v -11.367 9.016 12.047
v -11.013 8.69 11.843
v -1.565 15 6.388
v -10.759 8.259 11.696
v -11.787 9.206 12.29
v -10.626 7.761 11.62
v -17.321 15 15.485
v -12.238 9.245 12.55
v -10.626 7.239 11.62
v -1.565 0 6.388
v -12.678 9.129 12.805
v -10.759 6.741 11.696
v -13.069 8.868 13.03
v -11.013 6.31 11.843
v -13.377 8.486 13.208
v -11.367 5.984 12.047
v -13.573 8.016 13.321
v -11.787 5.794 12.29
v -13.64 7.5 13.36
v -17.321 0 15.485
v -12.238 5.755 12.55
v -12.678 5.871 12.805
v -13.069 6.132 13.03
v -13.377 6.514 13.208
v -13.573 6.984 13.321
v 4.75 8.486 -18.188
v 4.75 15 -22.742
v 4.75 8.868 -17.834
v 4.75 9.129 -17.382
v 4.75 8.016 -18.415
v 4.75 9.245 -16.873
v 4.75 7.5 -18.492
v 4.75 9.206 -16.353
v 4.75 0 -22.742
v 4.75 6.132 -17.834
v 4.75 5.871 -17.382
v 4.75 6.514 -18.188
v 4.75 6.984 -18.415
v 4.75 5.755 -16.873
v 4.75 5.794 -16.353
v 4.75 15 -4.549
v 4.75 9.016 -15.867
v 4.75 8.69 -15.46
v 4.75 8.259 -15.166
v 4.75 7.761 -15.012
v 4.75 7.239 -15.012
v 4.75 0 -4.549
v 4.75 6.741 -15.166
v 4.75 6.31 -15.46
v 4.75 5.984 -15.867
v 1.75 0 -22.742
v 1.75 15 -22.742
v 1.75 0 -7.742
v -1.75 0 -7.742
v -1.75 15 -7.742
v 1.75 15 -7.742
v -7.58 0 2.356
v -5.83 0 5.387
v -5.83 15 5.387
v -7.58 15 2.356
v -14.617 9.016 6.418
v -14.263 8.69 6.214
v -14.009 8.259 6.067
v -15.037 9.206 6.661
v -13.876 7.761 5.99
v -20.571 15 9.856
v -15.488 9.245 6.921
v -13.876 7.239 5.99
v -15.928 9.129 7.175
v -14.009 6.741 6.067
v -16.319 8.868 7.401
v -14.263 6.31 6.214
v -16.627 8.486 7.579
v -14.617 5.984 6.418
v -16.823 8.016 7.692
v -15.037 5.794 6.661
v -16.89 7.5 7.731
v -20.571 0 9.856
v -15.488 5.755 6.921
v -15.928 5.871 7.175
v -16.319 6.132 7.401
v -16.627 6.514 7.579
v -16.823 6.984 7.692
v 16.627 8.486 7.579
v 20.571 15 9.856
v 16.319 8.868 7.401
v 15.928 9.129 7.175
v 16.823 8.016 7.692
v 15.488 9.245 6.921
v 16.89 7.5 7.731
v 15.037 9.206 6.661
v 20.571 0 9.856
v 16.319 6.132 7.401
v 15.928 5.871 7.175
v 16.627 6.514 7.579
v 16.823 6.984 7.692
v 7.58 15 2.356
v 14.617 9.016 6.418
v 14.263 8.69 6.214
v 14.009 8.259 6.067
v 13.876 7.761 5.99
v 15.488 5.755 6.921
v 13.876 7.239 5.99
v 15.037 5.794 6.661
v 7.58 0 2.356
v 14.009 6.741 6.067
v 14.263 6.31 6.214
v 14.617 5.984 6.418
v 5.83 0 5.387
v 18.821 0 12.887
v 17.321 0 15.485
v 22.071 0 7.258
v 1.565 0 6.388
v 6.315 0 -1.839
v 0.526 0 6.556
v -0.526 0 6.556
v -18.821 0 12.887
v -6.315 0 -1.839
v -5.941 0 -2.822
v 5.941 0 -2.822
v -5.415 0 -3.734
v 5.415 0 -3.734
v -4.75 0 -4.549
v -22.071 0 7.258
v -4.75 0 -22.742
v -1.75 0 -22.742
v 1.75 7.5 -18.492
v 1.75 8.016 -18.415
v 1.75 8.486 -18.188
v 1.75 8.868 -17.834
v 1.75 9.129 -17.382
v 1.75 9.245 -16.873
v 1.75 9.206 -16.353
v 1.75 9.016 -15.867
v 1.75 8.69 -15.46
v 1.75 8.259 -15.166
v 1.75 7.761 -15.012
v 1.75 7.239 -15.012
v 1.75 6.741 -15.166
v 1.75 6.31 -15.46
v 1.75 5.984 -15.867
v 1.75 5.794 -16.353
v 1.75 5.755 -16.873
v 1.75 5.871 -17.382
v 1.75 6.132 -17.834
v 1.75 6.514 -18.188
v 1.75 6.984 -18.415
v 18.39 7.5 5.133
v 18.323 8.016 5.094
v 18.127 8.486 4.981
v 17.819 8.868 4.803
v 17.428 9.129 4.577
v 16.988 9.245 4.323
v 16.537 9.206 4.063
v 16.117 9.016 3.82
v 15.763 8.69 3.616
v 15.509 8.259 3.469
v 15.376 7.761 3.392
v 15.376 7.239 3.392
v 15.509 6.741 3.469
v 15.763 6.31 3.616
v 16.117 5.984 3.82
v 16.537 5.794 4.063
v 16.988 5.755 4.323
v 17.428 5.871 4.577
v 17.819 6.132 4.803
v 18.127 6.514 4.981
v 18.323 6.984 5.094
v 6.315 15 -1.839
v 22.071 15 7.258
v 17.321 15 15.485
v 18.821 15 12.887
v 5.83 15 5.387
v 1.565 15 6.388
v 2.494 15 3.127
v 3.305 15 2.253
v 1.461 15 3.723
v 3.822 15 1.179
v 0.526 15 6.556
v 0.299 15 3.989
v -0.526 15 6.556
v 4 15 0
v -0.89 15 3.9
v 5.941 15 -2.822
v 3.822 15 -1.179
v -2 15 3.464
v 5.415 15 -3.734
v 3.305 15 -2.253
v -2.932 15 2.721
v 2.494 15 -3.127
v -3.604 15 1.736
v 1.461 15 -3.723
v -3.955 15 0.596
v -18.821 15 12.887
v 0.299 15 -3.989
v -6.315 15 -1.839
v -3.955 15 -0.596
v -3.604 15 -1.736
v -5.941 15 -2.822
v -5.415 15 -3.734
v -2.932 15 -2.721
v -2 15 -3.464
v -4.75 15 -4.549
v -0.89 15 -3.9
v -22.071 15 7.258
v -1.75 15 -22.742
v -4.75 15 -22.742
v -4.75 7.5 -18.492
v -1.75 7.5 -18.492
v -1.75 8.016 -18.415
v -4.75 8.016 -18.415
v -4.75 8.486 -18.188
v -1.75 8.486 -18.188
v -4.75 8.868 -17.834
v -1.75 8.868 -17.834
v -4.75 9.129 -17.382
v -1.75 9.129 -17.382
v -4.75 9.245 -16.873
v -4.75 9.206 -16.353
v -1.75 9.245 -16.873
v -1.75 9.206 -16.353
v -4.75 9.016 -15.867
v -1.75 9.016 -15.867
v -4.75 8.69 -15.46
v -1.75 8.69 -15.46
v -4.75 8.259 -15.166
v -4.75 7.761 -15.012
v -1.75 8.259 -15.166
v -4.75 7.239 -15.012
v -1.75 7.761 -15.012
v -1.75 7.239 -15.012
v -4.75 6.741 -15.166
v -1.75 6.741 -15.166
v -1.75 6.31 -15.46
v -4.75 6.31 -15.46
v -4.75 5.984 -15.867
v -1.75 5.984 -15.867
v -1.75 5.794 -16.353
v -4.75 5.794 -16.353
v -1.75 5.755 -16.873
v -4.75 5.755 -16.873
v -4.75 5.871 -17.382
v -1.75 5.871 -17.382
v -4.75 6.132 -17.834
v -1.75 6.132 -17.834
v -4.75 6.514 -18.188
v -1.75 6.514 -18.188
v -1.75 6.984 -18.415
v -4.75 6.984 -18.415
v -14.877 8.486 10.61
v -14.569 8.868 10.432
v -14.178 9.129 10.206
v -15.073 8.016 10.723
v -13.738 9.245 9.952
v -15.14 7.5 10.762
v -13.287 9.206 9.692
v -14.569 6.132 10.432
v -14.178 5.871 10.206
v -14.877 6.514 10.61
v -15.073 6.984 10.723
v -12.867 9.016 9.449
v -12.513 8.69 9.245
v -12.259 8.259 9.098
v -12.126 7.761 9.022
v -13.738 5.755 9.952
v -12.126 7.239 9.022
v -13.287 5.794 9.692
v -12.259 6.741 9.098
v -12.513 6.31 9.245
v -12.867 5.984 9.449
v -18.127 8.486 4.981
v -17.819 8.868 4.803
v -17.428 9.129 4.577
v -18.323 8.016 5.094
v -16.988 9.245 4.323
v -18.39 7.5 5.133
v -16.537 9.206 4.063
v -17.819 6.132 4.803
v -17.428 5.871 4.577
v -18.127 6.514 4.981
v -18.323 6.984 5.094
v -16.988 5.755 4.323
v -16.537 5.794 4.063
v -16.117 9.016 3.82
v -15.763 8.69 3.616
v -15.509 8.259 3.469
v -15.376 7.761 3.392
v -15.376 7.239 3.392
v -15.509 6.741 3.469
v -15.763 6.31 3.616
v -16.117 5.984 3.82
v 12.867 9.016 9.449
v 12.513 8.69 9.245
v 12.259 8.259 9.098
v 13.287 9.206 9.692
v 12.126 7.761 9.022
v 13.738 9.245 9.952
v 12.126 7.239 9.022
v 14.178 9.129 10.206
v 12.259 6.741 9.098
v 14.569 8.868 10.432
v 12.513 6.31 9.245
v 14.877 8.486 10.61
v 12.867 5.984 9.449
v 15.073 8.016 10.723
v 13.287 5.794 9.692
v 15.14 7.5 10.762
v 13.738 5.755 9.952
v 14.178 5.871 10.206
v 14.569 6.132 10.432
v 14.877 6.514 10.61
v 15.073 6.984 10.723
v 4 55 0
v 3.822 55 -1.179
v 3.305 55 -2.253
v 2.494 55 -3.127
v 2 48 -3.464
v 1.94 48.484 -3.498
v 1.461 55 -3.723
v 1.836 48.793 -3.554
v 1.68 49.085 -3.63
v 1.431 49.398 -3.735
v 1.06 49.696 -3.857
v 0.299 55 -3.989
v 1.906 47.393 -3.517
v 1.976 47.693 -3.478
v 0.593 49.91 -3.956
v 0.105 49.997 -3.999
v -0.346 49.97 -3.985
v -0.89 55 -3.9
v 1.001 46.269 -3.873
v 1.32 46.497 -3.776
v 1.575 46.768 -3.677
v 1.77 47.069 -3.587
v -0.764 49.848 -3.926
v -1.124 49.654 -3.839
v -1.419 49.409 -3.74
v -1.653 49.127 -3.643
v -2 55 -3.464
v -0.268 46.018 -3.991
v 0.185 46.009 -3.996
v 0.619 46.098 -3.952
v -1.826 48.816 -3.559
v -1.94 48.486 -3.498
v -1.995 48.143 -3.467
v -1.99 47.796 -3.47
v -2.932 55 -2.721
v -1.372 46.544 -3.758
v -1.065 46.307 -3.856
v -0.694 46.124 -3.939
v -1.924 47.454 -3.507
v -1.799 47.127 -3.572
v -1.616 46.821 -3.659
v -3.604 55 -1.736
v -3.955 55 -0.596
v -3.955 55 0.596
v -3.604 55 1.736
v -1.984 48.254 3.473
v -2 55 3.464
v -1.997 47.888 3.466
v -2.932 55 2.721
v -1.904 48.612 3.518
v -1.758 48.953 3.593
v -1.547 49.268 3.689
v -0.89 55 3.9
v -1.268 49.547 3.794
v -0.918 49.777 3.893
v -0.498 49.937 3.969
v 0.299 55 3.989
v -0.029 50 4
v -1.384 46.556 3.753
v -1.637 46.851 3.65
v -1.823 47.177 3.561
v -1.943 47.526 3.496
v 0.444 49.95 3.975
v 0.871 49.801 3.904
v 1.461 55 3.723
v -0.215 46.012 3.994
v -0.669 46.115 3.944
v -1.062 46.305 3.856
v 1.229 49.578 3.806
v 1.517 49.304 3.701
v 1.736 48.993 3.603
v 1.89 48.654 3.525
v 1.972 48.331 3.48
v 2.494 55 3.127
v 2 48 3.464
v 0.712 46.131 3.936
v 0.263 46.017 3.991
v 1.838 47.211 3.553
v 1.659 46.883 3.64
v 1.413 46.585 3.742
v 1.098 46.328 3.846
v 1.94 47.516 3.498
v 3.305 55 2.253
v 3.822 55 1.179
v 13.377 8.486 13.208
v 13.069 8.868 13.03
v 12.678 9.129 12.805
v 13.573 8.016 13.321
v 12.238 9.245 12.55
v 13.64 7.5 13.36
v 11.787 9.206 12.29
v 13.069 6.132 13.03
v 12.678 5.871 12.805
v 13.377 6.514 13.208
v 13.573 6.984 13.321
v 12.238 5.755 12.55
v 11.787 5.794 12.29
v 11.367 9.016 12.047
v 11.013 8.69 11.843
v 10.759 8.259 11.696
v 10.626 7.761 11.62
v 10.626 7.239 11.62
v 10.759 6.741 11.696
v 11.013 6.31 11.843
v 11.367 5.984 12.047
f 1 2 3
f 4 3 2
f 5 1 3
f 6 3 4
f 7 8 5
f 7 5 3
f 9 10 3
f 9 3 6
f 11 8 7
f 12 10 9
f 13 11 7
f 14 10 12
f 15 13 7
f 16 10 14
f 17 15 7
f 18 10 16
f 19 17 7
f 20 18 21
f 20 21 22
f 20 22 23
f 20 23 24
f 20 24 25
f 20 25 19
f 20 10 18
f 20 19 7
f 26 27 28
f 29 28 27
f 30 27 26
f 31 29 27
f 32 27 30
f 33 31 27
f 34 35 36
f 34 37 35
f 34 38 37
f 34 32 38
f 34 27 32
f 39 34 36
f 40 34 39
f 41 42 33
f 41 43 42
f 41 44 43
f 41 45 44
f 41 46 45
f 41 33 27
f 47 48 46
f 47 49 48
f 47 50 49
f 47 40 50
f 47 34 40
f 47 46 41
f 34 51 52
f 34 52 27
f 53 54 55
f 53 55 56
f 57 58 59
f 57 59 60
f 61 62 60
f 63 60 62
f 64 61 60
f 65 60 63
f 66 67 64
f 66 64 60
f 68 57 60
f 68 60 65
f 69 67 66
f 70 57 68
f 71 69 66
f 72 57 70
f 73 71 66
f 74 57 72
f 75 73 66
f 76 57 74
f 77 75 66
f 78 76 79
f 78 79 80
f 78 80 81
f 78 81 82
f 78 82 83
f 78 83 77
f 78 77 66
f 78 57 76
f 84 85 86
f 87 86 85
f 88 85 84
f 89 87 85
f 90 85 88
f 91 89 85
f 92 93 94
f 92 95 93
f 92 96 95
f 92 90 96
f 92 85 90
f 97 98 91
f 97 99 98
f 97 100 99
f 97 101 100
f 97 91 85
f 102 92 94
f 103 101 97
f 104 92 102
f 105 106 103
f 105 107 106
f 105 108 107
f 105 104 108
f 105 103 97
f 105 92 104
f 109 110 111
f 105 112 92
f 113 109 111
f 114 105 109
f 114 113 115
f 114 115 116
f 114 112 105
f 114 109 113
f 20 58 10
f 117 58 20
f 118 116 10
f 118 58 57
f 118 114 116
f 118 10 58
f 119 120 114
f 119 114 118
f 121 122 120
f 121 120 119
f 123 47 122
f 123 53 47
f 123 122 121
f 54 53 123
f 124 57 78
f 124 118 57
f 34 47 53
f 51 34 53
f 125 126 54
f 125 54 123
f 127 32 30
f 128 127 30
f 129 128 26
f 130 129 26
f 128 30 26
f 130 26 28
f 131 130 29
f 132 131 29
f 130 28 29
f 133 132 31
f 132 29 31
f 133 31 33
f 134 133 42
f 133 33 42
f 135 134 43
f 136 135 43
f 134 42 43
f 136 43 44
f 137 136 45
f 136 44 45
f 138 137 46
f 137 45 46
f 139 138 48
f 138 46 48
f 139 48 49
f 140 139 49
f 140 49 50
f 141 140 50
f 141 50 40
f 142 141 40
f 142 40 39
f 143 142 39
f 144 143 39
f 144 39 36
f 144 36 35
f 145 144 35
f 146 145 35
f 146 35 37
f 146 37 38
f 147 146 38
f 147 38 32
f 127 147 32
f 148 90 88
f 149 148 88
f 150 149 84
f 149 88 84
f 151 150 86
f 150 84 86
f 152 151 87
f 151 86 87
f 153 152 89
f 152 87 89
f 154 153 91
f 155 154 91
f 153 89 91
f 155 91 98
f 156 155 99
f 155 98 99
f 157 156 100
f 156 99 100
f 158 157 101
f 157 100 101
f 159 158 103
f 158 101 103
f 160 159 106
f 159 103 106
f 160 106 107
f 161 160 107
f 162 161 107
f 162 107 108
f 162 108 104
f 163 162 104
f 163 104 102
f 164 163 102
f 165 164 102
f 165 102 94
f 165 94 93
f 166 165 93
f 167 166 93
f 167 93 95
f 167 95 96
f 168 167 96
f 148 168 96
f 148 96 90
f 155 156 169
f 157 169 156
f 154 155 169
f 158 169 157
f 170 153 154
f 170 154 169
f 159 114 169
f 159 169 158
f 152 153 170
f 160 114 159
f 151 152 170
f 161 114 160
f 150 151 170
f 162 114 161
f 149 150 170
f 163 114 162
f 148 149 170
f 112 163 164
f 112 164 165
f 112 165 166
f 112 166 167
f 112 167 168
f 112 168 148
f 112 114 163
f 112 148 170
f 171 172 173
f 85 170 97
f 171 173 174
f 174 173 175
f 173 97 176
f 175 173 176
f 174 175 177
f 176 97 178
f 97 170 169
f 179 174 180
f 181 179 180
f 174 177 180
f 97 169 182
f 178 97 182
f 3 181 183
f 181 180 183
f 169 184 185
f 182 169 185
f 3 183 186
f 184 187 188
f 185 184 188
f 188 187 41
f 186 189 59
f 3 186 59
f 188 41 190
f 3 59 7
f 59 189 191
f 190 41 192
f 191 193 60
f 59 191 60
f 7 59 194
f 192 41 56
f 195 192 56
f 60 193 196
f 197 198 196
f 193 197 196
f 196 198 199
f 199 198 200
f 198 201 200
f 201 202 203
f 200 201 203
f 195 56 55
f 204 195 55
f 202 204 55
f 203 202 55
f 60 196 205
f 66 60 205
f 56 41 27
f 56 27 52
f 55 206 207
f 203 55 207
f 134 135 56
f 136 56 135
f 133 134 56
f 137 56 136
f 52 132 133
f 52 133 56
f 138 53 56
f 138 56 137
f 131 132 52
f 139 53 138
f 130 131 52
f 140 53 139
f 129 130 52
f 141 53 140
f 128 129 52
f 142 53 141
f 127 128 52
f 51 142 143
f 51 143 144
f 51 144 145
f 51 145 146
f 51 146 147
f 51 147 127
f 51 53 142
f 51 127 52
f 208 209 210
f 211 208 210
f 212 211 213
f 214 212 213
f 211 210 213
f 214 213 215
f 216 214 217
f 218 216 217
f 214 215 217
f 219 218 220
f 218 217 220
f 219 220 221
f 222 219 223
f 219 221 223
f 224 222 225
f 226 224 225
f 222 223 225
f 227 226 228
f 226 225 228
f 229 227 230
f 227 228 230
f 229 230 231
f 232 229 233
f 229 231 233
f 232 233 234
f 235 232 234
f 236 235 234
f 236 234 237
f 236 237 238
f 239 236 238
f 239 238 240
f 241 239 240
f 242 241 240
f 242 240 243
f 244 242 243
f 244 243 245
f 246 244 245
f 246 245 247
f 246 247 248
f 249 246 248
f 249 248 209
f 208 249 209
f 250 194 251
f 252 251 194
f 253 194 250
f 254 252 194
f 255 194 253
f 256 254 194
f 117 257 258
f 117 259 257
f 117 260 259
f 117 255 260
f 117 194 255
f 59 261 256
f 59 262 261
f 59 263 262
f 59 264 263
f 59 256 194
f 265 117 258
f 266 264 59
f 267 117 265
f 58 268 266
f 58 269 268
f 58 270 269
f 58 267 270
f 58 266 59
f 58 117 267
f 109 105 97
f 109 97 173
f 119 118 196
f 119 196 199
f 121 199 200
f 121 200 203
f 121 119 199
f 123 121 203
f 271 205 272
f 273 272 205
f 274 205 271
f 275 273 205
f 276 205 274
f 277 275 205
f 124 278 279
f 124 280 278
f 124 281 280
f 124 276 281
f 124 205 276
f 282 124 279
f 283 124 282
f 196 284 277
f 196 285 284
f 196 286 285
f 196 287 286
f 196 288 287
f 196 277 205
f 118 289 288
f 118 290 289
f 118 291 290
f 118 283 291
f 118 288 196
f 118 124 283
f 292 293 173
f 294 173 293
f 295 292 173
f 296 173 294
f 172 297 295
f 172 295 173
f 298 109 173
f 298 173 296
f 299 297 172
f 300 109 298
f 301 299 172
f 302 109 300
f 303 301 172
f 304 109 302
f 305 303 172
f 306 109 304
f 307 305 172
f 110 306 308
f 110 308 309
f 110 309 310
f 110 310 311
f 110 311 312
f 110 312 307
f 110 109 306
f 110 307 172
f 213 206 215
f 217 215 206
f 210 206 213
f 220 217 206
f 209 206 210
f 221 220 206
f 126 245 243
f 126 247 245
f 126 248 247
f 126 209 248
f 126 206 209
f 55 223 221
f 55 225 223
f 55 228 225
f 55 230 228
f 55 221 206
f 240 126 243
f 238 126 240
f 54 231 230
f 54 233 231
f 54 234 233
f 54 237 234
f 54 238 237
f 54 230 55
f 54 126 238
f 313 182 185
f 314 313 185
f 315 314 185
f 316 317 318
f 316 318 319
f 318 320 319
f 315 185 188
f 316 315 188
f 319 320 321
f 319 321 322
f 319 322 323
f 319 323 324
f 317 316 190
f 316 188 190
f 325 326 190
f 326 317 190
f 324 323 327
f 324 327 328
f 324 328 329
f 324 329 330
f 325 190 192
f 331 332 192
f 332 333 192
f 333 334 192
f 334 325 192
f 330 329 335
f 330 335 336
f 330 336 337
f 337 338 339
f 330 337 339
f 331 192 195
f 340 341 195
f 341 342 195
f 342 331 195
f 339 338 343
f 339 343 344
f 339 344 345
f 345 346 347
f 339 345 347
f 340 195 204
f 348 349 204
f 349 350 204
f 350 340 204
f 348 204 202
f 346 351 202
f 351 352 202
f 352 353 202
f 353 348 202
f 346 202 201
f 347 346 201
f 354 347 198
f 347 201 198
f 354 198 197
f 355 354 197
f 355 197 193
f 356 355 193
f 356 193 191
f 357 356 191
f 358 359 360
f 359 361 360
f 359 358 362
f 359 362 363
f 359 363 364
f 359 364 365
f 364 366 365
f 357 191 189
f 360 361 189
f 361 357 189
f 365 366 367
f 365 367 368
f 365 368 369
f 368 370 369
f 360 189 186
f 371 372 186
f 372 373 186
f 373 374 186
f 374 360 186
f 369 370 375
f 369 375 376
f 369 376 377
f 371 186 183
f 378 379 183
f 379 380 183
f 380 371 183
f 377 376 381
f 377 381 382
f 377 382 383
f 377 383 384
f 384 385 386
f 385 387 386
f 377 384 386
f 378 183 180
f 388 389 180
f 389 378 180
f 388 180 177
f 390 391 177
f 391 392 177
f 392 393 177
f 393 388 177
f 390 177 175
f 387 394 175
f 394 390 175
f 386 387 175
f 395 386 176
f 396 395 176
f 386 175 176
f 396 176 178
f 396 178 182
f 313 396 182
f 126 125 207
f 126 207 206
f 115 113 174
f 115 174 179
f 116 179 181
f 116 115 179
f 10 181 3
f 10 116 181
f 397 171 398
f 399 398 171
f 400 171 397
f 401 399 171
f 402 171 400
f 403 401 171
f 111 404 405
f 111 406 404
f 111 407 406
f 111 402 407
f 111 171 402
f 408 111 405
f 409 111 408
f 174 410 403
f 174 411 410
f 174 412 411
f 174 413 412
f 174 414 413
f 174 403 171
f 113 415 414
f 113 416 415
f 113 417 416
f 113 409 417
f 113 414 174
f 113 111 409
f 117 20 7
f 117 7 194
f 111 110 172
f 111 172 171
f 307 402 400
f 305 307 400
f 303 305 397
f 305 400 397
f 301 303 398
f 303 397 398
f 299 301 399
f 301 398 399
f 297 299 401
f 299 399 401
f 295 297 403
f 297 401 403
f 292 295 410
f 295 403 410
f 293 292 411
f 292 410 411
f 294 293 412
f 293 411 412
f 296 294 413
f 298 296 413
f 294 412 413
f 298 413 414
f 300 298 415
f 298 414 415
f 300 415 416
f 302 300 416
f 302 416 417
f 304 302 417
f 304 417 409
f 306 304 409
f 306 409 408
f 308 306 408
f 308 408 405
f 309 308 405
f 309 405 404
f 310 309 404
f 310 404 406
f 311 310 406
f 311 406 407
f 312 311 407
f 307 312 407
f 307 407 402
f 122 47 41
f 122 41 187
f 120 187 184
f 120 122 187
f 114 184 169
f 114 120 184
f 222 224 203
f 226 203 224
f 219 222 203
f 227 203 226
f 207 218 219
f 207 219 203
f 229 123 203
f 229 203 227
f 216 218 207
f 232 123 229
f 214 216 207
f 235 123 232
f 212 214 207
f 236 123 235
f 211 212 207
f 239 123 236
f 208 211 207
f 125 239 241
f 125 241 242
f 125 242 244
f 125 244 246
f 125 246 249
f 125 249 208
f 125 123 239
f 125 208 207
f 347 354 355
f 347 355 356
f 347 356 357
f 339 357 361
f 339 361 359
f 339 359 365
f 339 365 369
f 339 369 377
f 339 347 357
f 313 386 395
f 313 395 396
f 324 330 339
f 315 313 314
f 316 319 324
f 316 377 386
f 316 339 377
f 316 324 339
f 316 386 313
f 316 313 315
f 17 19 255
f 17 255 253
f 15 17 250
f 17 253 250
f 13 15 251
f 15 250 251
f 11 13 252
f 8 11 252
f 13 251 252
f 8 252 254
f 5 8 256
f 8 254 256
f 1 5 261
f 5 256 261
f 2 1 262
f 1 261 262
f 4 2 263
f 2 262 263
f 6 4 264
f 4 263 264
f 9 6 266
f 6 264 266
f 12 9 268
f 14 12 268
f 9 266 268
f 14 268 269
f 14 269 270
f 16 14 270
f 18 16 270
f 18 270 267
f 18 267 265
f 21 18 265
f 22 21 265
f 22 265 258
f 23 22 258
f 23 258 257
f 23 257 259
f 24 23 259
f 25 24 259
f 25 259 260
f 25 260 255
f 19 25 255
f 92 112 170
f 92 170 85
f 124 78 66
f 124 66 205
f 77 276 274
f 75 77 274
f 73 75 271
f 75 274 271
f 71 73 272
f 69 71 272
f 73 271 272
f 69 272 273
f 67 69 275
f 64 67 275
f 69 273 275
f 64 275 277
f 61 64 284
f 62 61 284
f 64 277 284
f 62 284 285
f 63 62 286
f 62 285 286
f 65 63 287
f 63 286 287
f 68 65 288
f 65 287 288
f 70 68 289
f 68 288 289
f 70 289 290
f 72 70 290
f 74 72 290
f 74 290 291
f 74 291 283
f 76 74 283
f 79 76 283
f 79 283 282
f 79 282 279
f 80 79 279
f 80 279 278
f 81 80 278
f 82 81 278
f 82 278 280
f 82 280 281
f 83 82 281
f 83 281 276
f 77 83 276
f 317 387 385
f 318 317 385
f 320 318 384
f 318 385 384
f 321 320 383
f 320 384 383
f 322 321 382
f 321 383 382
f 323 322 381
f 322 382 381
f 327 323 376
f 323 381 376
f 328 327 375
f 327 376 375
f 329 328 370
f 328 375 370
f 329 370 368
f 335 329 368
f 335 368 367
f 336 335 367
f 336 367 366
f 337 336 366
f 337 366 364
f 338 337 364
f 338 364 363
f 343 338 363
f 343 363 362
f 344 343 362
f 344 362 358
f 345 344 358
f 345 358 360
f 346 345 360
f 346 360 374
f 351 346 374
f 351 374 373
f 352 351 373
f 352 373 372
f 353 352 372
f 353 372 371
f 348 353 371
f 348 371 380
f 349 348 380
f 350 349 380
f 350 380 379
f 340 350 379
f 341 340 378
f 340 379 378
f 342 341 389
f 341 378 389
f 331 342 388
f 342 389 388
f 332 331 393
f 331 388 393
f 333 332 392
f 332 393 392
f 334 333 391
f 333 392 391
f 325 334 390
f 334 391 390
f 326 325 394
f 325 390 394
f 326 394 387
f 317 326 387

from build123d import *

# Parameters (mm, degrees)
EXTRUDE_1_DEPTH     = 15
SKETCH_2_R          = 4
EXTRUDE_2_DEPTH     = 40
SKETCH_3_R          = 1.75
CUT_EXTRUDE_1_DEPTH = 15
SKETCH_4_R          = 1.75
CUT_EXTRUDE_2_DEPTH = 15
SKETCH_5_R          = 1.75
CUT_EXTRUDE_3_DEPTH = 15
SKETCH_7_R          = 2
CUT_EXTRUDE_4_DEPTH = 15


with BuildPart() as part:
    # 草圖1 → 填料-伸長1 (new body)
    with BuildSketch(Plane(origin=(0, 0, 0), x_dir=(1, 0, 0), z_dir=(0, 1, 0))):
        with BuildLine():
            Line((6.314953067, 1.838887704), (22.070508076, -7.257586221))
            Line((22.070508076, -7.257586221), (20.570508076, -9.855662433))
            Line((20.570508076, -9.855662433), (7.580127019, -2.355662433))
            Line((7.580127019, -2.355662433), (5.830127019, -5.386751346))
            Line((5.830127019, -5.386751346), (18.820508076, -12.886751346))
            Line((18.820508076, -12.886751346), (17.320508076, -15.484827557))
            Line((17.320508076, -15.484827557), (1.564953067, -6.388353632))
            ThreePointArc((1.564953067, -6.388353632), (0, -6.577244121), (-1.564953067, -6.388353632))
            Line((-1.564953067, -6.388353632), (-17.320508076, -15.484827557))
            Line((-17.320508076, -15.484827557), (-18.820508076, -12.886751346))
            Line((-18.820508076, -12.886751346), (-5.830127019, -5.386751346))
            Line((-5.830127019, -5.386751346), (-7.580127019, -2.355662433))
            Line((-7.580127019, -2.355662433), (-20.570508076, -9.855662433))
            Line((-20.570508076, -9.855662433), (-22.070508076, -7.257586221))
            Line((-22.070508076, -7.257586221), (-6.314953067, 1.838887704))
            ThreePointArc((-6.314953067, 1.838887704), (-5.696060496, 3.28862206), (-4.75, 4.549465928))
            Line((-4.75, 4.549465928), (-4.75, 22.742413779))
            Line((-4.75, 22.742413779), (-1.75, 22.742413779))
            Line((-1.75, 22.742413779), (-1.75, 7.742413779))
            Line((-1.75, 7.742413779), (1.75, 7.742413779))
            Line((1.75, 7.742413779), (1.75, 22.742413779))
            Line((1.75, 22.742413779), (4.75, 22.742413779))
            Line((4.75, 22.742413779), (4.75, 4.549465928))
            ThreePointArc((4.75, 4.549465928), (5.696060496, 3.28862206), (6.314953067, 1.838887704))
        make_face()
    extrude(amount=EXTRUDE_1_DEPTH)

    # 草圖2 → 填料-伸長2 (add)
    with BuildSketch(Plane(origin=(0, 15, 0), x_dir=(1, 0, 0), z_dir=(0, 1, 0))):
        Circle(SKETCH_2_R)
    extrude(amount=EXTRUDE_2_DEPTH)

    # 草圖3 → 除料-伸長1 (cut)
    with BuildSketch(Plane(origin=(4.75, 0, 0), x_dir=(0, 0, -1), z_dir=(1, 0, 0))):
        with Locations((16.742413779, 7.5)):
            Circle(SKETCH_3_R)
    extrude(amount=-CUT_EXTRUDE_1_DEPTH, mode=Mode.SUBTRACT)

    # 草圖4 → 除料-伸長2 (cut)
    with BuildSketch(Plane(origin=(-2.375, 0, -4.113620668), x_dir=(-0.866025404, 0, 0.5), z_dir=(-0.5, 0, -0.866025404))):
        with Locations((16.742413779, 7.5)):
            Circle(SKETCH_4_R)
    extrude(amount=-CUT_EXTRUDE_2_DEPTH, mode=Mode.SUBTRACT)

    # 草圖5 → 除料-伸長3 (cut)
    with BuildSketch(Plane(origin=(-2.375, 0, 4.113620668), x_dir=(0.866025404, 0, 0.5), z_dir=(-0.5, 0, 0.866025404))):
        with Locations((16.742413779, 7.5)):
            Circle(SKETCH_5_R)
    extrude(amount=-CUT_EXTRUDE_3_DEPTH, mode=Mode.SUBTRACT)

    # 草圖7 → 除料-伸長4 (cut)
    with BuildSketch(Plane.XY.offset(4)):
        with Locations((0, 48)):
            Circle(SKETCH_7_R)
    extrude(amount=-CUT_EXTRUDE_4_DEPTH, mode=Mode.SUBTRACT)


solid = part.part
